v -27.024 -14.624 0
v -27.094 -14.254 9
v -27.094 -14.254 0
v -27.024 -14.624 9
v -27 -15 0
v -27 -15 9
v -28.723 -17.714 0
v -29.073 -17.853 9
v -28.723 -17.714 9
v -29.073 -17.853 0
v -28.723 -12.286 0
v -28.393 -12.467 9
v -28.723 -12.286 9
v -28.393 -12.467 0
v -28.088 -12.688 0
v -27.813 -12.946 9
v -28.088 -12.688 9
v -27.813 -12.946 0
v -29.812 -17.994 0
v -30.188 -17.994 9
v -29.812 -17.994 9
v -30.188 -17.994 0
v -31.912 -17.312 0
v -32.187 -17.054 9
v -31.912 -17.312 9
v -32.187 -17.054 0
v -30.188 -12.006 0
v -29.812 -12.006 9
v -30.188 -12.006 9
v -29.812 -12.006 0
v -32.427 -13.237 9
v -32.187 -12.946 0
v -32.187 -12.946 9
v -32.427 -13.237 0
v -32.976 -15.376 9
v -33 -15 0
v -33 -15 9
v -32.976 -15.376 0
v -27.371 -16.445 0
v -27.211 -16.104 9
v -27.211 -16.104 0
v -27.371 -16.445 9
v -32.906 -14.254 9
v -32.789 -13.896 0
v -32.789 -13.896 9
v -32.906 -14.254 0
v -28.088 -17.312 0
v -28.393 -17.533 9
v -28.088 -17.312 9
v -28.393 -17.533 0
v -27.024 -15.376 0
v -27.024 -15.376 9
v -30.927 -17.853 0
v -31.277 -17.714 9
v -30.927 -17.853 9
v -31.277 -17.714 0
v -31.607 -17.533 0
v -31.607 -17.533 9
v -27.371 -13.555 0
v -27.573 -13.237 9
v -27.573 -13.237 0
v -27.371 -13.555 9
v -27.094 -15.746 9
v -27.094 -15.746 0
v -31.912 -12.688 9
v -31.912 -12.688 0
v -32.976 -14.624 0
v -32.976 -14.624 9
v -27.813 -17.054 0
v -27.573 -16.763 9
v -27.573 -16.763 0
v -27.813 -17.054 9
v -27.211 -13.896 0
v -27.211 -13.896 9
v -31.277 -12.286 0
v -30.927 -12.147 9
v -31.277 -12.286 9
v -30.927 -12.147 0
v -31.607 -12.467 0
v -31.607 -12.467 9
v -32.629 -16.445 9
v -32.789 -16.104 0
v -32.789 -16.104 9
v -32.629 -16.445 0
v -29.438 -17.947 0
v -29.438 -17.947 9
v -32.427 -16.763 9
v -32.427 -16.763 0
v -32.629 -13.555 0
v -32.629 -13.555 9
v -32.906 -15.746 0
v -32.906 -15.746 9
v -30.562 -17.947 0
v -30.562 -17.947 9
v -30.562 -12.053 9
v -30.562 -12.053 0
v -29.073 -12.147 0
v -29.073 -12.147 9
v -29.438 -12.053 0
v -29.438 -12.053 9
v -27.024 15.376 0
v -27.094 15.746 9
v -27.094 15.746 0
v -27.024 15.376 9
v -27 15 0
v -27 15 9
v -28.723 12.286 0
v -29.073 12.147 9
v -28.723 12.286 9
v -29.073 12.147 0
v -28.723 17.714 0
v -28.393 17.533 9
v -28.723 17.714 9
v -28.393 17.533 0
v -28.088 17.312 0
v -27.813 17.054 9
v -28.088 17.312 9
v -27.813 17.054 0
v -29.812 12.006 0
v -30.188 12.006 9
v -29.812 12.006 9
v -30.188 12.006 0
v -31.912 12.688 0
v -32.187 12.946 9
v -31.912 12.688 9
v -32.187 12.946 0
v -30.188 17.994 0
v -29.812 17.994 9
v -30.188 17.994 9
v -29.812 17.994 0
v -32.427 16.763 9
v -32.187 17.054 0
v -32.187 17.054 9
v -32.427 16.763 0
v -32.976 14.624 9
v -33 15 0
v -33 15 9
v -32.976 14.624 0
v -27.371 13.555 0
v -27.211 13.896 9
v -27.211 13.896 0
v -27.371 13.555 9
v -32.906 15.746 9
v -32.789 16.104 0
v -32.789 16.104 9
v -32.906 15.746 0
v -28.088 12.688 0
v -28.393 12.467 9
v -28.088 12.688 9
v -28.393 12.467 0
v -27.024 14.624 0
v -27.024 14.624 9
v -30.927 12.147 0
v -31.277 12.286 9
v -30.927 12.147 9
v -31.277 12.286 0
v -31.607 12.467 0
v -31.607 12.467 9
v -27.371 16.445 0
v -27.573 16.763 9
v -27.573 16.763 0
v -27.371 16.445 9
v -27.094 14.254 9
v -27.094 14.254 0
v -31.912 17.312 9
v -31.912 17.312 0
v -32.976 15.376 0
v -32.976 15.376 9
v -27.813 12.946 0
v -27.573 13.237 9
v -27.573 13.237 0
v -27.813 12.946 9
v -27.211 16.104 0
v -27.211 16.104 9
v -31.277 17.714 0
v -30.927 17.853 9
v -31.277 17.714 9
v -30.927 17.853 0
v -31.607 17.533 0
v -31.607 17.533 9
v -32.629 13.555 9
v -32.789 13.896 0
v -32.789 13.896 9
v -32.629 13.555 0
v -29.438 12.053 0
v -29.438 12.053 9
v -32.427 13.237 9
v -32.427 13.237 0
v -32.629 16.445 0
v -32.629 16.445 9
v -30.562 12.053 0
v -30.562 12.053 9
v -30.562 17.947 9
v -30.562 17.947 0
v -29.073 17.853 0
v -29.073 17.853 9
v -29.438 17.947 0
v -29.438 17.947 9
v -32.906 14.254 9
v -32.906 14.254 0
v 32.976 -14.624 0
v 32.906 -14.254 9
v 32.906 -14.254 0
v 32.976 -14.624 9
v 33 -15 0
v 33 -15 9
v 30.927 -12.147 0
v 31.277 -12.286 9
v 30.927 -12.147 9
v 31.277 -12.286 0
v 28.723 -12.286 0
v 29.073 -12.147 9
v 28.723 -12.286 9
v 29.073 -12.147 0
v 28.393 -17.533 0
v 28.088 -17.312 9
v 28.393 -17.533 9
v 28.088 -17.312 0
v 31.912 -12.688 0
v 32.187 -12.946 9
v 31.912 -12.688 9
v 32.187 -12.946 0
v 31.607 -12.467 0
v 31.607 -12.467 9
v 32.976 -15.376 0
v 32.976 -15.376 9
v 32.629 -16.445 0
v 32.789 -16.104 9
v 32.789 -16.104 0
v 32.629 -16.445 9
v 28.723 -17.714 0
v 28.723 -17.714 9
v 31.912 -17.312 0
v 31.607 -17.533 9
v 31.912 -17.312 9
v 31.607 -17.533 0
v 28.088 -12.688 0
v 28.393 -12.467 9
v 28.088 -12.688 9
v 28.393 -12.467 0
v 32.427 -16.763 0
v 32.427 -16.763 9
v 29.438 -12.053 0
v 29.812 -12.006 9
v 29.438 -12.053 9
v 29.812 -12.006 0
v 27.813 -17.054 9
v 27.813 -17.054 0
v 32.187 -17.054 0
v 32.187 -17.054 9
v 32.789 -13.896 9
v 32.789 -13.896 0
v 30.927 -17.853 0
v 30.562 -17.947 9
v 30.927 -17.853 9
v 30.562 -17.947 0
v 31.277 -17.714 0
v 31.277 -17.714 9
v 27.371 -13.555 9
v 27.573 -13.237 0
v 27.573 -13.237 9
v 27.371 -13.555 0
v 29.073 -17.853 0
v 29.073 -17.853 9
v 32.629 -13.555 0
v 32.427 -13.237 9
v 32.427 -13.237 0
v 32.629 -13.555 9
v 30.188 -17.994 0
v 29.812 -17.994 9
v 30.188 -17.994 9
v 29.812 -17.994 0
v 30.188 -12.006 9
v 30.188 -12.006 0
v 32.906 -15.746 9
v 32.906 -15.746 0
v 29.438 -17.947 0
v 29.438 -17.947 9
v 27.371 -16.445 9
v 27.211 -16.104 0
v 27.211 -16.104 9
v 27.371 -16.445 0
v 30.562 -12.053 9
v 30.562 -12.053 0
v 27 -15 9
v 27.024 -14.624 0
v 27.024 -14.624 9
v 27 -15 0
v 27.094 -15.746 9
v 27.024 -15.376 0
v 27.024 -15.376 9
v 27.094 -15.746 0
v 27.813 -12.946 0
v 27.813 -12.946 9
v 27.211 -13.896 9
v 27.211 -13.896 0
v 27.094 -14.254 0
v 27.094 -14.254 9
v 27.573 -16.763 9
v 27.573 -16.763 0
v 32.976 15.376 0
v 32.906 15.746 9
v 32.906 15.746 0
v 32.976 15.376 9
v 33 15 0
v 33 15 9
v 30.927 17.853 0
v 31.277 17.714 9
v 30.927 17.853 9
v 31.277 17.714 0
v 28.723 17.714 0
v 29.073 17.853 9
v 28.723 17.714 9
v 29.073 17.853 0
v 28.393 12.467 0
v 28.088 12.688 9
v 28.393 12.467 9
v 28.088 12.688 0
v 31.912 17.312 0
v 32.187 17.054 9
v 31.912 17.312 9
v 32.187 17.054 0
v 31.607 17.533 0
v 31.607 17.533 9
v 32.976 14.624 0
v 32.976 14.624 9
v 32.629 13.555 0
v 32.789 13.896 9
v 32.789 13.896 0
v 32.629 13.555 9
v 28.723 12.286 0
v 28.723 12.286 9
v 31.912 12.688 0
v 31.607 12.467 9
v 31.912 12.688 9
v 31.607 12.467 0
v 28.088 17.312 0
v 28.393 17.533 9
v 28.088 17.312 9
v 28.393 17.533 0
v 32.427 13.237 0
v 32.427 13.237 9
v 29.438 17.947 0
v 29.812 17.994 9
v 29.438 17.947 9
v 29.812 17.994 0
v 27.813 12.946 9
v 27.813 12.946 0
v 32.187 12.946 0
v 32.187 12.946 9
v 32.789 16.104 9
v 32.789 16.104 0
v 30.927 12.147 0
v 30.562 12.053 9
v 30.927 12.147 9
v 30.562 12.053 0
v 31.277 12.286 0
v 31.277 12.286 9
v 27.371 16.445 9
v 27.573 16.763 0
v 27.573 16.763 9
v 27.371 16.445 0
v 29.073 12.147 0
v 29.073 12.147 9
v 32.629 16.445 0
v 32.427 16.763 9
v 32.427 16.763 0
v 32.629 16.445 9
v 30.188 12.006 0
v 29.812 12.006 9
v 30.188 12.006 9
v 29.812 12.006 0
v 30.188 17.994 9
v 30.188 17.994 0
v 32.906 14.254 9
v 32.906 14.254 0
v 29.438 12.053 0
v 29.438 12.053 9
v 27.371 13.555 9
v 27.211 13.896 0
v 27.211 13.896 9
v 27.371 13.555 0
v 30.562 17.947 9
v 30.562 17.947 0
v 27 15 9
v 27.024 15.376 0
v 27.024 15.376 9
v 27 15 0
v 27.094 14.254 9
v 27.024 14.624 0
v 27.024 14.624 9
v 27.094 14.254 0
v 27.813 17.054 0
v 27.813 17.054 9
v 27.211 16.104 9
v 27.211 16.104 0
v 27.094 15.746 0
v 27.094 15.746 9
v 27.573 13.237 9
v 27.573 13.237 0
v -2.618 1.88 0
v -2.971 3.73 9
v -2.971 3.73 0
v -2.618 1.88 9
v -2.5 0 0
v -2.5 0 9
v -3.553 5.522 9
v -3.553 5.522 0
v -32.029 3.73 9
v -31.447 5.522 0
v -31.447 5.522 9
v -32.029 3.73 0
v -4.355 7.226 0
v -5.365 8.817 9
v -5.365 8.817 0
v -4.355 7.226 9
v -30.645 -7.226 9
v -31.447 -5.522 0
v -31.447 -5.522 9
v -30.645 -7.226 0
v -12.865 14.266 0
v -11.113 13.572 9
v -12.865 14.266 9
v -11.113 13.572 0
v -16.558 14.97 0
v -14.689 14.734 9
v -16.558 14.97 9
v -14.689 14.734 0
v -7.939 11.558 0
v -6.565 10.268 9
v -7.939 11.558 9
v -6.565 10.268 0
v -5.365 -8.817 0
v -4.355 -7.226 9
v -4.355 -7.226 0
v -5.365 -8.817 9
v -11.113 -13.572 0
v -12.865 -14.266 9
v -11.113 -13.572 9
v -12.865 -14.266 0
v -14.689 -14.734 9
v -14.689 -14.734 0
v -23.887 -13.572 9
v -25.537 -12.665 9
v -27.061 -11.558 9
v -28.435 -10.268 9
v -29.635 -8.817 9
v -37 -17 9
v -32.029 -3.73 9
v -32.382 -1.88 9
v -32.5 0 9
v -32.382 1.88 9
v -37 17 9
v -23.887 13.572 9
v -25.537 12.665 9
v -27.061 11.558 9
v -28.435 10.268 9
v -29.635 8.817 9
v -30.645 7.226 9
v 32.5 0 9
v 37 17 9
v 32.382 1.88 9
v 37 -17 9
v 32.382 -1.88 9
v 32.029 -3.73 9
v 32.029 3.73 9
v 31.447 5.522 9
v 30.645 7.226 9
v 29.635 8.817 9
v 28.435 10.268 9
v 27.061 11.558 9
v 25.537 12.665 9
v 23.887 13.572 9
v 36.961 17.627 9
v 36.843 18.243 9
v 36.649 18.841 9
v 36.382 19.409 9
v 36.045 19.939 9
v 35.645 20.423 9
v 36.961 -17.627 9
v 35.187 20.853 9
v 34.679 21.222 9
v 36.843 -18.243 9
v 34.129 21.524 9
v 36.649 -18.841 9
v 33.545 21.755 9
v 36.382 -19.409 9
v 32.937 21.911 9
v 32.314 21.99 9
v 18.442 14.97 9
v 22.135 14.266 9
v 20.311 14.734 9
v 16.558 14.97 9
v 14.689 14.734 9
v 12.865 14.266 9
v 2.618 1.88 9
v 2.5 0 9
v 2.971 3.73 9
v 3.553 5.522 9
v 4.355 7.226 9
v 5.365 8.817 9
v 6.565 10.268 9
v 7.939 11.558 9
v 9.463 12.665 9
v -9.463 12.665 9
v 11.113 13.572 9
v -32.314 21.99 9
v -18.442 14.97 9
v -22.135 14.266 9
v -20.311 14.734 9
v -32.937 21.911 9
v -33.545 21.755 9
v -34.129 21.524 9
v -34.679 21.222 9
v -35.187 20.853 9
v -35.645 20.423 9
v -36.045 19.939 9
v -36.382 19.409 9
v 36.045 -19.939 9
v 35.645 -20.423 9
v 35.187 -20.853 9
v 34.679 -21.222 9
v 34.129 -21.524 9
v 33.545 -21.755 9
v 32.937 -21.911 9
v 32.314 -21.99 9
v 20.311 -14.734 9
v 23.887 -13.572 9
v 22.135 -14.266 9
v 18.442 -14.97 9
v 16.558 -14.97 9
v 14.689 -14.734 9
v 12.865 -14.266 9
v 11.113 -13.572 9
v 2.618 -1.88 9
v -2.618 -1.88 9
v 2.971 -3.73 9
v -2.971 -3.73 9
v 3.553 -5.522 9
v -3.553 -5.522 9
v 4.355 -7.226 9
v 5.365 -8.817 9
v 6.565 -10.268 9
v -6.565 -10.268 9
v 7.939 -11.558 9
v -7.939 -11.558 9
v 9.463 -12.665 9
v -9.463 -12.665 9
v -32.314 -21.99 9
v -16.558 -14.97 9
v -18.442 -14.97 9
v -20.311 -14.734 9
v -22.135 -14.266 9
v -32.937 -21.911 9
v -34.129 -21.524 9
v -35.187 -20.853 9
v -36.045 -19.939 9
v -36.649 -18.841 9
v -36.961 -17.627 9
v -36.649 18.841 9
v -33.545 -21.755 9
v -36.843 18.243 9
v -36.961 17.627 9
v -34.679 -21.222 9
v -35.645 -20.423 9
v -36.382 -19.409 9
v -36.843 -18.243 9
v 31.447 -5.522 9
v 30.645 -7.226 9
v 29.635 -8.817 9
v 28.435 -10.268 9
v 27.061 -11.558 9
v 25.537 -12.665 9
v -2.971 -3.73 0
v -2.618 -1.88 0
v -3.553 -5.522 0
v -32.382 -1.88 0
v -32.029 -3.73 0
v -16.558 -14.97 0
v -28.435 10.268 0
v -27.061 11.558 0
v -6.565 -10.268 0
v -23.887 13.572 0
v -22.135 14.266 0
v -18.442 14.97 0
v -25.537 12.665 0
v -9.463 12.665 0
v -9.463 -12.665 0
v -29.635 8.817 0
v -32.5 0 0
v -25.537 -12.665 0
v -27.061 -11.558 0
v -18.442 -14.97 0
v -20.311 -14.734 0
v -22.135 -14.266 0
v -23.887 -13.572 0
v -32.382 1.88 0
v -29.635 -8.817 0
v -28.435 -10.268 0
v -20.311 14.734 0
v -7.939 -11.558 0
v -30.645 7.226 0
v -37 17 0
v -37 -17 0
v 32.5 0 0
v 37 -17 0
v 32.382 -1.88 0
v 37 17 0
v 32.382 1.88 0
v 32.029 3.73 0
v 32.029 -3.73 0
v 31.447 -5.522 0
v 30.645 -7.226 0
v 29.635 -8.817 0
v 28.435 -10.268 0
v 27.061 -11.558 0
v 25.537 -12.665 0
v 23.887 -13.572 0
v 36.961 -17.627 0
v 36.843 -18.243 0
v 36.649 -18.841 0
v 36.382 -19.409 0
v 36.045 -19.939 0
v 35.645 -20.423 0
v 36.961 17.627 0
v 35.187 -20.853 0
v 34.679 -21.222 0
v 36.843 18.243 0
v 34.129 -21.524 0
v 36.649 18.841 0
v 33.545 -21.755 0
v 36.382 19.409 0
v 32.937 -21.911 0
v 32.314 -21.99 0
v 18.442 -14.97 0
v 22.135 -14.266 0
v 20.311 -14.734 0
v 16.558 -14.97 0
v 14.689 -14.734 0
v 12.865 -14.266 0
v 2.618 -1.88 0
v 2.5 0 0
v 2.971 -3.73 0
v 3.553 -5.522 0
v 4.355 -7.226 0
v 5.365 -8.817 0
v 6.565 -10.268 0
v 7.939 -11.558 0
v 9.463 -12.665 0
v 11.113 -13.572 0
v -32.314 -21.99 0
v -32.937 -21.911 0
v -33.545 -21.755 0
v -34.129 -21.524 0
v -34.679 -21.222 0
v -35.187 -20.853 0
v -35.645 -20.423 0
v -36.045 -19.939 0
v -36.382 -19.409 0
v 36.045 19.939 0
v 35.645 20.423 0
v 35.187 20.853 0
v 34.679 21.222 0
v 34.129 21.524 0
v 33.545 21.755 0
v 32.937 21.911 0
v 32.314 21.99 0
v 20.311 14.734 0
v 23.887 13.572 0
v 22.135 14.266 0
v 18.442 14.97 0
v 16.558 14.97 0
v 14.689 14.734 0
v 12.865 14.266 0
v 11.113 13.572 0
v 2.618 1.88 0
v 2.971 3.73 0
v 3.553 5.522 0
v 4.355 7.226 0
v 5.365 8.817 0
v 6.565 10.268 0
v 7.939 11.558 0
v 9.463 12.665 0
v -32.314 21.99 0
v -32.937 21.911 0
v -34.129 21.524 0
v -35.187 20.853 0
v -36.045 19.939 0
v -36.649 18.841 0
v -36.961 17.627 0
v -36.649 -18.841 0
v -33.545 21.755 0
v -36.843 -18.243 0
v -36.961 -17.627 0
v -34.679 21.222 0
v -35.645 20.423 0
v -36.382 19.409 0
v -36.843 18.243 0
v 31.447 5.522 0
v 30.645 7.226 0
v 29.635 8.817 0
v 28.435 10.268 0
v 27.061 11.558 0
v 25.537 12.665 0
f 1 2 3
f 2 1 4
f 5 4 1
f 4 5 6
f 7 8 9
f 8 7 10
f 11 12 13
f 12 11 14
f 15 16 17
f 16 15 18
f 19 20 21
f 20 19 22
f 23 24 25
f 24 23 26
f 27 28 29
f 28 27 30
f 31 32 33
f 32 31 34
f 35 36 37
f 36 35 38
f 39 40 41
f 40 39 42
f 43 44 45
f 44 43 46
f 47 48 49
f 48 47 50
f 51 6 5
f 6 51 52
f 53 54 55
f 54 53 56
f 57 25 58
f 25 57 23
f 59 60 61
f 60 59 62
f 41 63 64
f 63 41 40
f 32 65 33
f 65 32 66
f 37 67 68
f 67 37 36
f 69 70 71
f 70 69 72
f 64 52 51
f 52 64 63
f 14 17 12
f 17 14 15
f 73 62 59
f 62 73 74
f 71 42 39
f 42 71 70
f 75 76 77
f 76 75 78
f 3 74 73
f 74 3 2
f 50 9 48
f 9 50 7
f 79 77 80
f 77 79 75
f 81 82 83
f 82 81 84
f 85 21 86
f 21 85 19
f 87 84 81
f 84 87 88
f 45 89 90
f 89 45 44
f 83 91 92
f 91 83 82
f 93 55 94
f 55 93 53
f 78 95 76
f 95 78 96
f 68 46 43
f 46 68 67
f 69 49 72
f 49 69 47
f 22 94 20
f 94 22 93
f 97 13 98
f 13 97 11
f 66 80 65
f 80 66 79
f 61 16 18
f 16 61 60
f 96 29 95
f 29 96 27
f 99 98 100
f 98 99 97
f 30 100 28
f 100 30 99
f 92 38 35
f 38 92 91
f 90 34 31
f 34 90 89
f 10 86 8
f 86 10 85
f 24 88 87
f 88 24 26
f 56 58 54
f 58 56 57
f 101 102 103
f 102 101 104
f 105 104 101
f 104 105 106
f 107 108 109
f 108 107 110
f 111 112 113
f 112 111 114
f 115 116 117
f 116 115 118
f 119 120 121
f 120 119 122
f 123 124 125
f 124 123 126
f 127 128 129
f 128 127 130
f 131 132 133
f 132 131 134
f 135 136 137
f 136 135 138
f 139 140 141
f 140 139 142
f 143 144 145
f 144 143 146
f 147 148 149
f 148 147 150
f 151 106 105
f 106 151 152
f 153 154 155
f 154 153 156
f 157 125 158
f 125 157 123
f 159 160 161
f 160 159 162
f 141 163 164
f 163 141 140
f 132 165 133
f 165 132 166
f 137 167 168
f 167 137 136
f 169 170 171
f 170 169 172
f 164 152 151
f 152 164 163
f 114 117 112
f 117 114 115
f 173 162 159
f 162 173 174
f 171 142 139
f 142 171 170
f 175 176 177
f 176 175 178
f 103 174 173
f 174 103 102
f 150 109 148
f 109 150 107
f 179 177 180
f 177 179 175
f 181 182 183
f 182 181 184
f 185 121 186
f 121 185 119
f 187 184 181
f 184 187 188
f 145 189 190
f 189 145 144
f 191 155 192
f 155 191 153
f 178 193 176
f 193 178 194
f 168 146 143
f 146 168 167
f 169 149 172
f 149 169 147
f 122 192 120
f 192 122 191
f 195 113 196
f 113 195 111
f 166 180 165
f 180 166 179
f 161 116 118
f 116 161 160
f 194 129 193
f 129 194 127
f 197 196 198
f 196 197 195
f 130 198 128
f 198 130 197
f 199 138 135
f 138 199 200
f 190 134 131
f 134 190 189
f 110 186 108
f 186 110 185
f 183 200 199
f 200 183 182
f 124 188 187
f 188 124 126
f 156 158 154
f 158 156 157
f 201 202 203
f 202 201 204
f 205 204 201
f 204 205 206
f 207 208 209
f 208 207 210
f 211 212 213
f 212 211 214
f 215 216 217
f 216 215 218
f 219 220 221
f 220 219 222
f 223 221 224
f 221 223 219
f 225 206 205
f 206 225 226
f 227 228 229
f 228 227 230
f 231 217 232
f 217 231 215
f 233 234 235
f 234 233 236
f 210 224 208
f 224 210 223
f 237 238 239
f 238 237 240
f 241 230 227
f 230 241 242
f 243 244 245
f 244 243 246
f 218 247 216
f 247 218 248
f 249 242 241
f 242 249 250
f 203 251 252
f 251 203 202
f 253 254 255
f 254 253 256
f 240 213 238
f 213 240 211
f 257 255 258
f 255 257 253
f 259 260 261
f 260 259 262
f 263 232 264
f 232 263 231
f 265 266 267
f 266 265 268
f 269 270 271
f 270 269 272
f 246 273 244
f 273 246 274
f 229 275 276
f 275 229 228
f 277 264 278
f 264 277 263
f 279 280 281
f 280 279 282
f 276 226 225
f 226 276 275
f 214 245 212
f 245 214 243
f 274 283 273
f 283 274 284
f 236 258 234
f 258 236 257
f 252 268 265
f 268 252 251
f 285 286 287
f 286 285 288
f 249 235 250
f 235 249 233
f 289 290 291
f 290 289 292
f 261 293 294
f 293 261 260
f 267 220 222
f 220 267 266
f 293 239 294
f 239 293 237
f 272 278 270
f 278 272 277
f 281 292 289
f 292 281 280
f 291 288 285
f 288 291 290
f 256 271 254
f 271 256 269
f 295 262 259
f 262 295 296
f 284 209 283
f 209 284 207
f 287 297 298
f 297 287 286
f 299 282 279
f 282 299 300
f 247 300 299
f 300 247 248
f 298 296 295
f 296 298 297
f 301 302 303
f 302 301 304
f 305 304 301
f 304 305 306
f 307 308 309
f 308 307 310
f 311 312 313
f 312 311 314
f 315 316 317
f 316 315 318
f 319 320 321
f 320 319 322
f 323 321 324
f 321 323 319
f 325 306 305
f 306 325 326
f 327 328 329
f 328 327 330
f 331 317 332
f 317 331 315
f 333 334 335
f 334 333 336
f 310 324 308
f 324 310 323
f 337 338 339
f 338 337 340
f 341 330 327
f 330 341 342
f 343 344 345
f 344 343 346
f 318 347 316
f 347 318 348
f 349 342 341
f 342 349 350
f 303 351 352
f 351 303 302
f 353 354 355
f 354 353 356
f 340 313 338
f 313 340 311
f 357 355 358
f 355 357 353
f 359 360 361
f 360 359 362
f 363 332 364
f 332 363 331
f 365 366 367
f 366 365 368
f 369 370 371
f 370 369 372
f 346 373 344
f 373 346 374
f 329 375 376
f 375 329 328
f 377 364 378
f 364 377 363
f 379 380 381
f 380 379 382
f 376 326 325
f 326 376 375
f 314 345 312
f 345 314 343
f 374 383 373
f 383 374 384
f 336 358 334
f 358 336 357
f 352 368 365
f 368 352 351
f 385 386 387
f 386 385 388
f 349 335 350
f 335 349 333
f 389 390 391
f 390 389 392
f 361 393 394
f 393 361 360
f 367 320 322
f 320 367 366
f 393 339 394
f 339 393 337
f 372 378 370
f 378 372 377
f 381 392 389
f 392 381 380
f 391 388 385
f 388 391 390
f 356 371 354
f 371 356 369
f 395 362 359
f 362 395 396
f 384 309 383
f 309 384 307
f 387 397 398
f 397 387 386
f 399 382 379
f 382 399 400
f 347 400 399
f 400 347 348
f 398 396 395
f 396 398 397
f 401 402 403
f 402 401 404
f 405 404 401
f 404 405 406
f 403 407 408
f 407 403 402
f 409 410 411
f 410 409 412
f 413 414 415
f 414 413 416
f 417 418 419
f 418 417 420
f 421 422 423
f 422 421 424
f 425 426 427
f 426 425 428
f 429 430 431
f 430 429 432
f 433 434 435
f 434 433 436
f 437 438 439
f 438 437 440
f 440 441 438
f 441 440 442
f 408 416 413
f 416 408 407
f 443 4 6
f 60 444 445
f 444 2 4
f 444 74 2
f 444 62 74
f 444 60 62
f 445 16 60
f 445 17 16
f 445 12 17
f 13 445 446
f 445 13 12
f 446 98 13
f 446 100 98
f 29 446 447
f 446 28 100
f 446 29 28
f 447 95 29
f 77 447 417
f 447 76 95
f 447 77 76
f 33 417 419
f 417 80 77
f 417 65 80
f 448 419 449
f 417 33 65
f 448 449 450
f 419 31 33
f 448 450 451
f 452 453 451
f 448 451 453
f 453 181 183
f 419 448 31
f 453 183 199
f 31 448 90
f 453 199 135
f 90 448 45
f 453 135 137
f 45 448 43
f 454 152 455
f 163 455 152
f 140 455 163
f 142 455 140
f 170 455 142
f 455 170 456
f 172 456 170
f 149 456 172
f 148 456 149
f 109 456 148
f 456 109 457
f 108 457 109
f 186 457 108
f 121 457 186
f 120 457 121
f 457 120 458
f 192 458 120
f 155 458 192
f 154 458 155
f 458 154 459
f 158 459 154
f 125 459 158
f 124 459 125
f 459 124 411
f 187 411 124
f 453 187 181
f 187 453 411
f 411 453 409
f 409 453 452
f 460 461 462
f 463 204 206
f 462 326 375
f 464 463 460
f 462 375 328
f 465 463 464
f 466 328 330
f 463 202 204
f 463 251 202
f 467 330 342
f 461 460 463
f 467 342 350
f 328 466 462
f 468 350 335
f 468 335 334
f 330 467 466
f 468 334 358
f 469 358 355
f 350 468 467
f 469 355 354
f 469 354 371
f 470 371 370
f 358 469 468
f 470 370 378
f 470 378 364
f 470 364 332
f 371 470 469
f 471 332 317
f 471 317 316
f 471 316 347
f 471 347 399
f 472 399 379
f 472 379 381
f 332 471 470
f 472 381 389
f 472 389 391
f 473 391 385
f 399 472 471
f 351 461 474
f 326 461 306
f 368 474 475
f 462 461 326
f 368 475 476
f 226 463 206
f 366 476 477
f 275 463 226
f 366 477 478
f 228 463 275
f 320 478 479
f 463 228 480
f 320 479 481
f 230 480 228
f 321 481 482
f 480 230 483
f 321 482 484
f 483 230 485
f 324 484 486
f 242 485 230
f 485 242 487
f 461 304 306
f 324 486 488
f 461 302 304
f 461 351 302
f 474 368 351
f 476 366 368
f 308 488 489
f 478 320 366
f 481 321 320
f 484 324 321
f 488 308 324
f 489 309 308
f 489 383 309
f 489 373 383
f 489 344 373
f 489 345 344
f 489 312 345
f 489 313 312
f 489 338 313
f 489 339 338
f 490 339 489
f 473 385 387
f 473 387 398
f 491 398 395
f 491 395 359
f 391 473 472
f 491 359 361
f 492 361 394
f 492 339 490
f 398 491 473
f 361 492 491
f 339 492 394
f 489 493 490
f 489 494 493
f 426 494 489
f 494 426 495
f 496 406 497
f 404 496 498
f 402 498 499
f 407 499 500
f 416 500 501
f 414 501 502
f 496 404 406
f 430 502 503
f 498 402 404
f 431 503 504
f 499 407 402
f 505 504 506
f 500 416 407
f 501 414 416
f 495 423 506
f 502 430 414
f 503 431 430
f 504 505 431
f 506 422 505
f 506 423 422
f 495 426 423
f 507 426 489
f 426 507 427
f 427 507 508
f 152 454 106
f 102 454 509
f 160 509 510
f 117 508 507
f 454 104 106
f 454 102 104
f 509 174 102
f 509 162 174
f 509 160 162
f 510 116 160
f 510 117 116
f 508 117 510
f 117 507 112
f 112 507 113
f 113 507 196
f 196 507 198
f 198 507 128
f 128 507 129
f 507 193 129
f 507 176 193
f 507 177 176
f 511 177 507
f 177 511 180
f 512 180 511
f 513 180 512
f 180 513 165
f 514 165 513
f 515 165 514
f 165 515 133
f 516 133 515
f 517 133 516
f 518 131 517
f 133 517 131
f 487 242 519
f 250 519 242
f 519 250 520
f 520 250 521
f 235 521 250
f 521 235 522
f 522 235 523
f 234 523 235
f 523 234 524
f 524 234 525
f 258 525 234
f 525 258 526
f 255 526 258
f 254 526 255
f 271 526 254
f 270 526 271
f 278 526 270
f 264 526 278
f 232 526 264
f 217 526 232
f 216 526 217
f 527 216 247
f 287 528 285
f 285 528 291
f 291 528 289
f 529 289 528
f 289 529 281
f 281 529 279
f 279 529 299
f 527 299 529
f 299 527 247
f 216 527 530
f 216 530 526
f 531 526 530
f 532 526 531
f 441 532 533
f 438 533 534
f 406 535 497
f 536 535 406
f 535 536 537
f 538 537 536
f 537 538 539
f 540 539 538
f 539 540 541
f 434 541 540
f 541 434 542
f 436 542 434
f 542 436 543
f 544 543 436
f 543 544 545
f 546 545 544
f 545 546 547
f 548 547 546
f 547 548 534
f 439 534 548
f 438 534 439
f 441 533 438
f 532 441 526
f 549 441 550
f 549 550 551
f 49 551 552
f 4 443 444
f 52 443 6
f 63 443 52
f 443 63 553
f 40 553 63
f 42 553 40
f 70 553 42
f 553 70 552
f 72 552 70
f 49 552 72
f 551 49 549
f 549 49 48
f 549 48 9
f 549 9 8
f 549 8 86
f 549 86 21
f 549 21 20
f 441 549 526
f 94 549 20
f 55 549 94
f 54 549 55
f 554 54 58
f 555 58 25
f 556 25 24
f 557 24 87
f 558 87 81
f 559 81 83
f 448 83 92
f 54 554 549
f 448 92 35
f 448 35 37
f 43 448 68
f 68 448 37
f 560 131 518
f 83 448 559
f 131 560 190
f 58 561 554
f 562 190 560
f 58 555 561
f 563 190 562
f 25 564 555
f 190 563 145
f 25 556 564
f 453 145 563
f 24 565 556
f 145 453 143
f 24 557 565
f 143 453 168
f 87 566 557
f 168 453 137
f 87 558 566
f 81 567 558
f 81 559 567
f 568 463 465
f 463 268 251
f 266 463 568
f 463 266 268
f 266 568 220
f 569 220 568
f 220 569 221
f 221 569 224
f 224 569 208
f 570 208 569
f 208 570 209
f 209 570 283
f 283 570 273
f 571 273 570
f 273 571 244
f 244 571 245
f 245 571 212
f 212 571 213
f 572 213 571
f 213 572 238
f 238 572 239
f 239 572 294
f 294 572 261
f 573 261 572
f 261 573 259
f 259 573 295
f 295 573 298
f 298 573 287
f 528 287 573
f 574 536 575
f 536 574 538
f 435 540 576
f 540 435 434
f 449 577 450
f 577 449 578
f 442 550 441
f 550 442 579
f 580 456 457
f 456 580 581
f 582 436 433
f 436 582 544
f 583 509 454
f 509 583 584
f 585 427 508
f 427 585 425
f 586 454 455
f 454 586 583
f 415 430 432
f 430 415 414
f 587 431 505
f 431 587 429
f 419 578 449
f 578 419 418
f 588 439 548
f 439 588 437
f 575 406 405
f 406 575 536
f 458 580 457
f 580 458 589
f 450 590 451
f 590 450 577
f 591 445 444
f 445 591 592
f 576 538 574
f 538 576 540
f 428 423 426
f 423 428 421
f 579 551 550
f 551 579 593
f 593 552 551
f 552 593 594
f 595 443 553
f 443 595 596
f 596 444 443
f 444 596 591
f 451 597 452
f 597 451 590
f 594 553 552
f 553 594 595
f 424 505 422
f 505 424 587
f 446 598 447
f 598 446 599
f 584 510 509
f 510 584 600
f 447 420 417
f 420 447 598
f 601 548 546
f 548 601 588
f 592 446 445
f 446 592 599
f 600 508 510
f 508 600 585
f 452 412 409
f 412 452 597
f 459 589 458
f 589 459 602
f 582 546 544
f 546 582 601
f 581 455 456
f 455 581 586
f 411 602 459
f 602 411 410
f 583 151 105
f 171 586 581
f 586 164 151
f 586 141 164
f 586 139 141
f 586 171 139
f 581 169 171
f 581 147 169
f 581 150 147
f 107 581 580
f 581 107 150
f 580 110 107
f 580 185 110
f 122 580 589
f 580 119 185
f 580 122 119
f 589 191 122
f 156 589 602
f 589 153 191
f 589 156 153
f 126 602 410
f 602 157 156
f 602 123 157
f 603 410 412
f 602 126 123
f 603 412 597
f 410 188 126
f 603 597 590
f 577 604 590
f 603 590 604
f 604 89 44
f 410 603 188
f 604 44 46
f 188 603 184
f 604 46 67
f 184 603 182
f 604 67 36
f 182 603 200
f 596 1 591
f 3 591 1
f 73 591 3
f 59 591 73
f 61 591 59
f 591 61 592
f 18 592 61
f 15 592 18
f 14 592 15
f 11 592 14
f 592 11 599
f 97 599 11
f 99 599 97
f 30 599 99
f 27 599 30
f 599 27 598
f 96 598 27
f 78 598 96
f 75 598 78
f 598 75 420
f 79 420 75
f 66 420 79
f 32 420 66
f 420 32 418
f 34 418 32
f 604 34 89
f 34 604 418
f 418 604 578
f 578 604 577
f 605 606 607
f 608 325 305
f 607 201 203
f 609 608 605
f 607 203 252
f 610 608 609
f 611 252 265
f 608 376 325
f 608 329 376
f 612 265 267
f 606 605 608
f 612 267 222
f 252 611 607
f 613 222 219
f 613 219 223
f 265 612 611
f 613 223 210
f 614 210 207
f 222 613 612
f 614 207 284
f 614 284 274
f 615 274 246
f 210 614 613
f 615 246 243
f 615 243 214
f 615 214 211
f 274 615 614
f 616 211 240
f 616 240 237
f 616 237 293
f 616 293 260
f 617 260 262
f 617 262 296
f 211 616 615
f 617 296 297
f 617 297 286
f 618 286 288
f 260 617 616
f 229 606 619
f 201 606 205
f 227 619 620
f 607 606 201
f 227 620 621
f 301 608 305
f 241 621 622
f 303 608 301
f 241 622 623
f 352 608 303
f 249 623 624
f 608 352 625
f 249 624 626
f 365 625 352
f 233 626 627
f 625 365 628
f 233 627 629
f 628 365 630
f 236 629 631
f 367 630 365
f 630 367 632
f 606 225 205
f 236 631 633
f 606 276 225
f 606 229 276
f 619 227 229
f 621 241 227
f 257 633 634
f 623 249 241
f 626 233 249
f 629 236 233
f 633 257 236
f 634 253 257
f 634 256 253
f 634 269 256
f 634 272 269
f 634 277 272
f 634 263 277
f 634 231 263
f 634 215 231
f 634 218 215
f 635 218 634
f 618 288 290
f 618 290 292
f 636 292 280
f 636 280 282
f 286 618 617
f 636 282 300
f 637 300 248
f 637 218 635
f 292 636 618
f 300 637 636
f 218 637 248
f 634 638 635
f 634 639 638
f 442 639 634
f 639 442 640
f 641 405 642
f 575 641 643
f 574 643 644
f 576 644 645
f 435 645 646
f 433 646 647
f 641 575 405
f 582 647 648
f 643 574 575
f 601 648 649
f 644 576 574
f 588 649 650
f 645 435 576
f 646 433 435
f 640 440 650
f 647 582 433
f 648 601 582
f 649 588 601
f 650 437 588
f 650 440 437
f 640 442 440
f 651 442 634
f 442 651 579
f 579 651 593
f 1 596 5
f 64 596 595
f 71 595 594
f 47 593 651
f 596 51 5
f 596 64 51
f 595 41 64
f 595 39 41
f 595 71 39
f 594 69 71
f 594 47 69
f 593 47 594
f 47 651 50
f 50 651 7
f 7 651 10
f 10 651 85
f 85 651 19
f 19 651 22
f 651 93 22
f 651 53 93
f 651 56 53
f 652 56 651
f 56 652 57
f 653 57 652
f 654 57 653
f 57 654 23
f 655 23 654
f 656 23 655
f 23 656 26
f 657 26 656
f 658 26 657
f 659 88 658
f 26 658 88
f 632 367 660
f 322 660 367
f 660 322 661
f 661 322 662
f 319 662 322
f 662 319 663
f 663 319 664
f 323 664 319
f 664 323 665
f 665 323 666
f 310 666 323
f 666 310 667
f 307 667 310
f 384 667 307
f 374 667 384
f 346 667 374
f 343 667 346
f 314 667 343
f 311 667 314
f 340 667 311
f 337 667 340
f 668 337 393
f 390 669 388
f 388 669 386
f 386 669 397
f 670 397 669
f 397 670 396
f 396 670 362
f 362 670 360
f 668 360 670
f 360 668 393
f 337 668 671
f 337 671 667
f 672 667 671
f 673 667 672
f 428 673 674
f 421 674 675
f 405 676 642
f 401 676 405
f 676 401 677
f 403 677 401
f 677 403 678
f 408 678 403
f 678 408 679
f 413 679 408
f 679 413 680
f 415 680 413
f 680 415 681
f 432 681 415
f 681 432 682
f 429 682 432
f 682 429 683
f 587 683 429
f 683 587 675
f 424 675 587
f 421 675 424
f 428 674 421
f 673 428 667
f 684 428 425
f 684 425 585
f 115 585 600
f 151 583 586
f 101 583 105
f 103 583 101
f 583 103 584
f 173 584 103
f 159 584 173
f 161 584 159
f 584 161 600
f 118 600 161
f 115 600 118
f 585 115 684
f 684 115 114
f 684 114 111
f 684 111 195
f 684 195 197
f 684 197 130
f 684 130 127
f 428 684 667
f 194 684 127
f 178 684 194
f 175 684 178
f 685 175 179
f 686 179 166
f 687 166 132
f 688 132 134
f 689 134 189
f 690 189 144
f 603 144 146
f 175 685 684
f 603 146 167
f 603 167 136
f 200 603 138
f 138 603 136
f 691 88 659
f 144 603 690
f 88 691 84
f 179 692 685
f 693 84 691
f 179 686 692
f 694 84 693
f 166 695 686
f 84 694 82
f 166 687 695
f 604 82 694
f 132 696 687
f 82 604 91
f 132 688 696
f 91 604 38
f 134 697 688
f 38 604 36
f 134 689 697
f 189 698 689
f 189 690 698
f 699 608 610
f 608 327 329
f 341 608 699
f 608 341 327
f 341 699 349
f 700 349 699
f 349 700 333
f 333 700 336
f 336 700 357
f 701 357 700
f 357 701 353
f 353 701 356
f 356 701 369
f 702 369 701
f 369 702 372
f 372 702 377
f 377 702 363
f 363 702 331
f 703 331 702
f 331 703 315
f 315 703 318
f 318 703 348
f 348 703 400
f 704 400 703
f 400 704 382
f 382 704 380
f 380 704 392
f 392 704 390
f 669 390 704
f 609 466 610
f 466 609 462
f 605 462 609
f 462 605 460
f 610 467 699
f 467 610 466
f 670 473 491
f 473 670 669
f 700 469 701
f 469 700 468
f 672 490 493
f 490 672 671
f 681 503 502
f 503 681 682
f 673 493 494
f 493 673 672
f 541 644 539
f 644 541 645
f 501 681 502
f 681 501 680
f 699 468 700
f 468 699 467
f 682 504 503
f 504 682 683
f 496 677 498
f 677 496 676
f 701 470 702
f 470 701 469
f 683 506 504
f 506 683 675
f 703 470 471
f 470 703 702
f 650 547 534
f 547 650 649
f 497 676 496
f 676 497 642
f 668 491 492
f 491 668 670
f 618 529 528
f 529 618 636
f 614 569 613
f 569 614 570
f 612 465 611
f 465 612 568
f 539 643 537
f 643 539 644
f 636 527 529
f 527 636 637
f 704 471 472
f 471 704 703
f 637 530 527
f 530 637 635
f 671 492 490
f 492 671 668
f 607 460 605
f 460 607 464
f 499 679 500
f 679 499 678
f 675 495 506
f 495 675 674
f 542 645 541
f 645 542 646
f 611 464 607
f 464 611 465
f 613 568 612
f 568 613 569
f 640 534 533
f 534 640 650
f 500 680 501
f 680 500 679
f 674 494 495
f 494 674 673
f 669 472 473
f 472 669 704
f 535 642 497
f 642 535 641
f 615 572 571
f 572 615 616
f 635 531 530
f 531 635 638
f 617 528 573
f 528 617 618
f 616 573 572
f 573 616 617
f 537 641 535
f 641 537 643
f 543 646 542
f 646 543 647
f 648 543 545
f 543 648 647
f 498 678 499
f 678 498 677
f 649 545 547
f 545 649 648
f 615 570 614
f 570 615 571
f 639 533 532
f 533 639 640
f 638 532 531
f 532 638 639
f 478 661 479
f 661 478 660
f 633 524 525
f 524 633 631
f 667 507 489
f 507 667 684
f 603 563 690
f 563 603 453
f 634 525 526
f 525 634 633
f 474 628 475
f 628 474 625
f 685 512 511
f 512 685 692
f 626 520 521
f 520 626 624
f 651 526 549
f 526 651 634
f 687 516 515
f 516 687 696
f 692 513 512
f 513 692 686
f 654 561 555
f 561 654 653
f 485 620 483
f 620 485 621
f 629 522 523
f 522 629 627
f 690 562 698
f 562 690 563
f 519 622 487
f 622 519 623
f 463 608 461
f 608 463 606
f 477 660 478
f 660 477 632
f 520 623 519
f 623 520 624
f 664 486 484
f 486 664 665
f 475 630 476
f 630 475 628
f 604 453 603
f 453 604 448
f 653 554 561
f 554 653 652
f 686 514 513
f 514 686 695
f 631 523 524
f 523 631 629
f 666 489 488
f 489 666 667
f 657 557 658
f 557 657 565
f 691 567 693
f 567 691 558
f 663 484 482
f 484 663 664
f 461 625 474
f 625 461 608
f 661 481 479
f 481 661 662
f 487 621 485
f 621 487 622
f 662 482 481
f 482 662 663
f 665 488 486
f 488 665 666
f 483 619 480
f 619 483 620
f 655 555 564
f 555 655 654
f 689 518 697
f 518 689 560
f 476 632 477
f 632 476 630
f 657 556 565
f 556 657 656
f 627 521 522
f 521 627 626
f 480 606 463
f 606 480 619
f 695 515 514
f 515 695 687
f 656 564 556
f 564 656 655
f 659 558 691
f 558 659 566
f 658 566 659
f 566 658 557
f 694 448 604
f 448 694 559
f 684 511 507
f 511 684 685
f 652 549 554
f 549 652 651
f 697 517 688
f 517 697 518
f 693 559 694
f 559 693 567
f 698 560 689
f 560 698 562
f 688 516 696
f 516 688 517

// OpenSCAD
$fn = 50;

difference() {
	union() {
		hull() {
			translate(v = [-32.0, 17.0, 0]) {
				cylinder(h = 9, r = 5);
			}
			translate(v = [32.0, 17.0, 0]) {
				cylinder(h = 9, r = 5);
			}
			translate(v = [-32.0, -17.0, 0]) {
				cylinder(h = 9, r = 5);
			}
			translate(v = [32.0, -17.0, 0]) {
				cylinder(h = 9, r = 5);
			}
		}
	}
	union() {
		translate(v = [-30.0, -15.0, -100.0]) {
			cylinder(h = 200, r = 3.0);
		}
		translate(v = [-30.0, 15.0, -100.0]) {
			cylinder(h = 200, r = 3.0);
		}
		translate(v = [30.0, -15.0, -100.0]) {
			cylinder(h = 200, r = 3.0);
		}
		translate(v = [30.0, 15.0, -100.0]) {
			cylinder(h = 200, r = 3.0);
		}
		translate(v = [-30.0, -15.0, -100.0]) {
			cylinder(h = 200, r = 1.5);
		}
		translate(v = [-30.0, 15.0, -100.0]) {
			cylinder(h = 200, r = 1.5);
		}
		translate(v = [30.0, -15.0, -100.0]) {
			cylinder(h = 200, r = 1.5);
		}
		translate(v = [30.0, 15.0, -100.0]) {
			cylinder(h = 200, r = 1.5);
		}
		translate(v = [-17.5, 0, 0.0]) {
			cylinder(h = 9, r = 15.0);
		}
		translate(v = [17.5, 0, 0.0]) {
			cylinder(h = 9, r = 15.0);
		}
	}
}
